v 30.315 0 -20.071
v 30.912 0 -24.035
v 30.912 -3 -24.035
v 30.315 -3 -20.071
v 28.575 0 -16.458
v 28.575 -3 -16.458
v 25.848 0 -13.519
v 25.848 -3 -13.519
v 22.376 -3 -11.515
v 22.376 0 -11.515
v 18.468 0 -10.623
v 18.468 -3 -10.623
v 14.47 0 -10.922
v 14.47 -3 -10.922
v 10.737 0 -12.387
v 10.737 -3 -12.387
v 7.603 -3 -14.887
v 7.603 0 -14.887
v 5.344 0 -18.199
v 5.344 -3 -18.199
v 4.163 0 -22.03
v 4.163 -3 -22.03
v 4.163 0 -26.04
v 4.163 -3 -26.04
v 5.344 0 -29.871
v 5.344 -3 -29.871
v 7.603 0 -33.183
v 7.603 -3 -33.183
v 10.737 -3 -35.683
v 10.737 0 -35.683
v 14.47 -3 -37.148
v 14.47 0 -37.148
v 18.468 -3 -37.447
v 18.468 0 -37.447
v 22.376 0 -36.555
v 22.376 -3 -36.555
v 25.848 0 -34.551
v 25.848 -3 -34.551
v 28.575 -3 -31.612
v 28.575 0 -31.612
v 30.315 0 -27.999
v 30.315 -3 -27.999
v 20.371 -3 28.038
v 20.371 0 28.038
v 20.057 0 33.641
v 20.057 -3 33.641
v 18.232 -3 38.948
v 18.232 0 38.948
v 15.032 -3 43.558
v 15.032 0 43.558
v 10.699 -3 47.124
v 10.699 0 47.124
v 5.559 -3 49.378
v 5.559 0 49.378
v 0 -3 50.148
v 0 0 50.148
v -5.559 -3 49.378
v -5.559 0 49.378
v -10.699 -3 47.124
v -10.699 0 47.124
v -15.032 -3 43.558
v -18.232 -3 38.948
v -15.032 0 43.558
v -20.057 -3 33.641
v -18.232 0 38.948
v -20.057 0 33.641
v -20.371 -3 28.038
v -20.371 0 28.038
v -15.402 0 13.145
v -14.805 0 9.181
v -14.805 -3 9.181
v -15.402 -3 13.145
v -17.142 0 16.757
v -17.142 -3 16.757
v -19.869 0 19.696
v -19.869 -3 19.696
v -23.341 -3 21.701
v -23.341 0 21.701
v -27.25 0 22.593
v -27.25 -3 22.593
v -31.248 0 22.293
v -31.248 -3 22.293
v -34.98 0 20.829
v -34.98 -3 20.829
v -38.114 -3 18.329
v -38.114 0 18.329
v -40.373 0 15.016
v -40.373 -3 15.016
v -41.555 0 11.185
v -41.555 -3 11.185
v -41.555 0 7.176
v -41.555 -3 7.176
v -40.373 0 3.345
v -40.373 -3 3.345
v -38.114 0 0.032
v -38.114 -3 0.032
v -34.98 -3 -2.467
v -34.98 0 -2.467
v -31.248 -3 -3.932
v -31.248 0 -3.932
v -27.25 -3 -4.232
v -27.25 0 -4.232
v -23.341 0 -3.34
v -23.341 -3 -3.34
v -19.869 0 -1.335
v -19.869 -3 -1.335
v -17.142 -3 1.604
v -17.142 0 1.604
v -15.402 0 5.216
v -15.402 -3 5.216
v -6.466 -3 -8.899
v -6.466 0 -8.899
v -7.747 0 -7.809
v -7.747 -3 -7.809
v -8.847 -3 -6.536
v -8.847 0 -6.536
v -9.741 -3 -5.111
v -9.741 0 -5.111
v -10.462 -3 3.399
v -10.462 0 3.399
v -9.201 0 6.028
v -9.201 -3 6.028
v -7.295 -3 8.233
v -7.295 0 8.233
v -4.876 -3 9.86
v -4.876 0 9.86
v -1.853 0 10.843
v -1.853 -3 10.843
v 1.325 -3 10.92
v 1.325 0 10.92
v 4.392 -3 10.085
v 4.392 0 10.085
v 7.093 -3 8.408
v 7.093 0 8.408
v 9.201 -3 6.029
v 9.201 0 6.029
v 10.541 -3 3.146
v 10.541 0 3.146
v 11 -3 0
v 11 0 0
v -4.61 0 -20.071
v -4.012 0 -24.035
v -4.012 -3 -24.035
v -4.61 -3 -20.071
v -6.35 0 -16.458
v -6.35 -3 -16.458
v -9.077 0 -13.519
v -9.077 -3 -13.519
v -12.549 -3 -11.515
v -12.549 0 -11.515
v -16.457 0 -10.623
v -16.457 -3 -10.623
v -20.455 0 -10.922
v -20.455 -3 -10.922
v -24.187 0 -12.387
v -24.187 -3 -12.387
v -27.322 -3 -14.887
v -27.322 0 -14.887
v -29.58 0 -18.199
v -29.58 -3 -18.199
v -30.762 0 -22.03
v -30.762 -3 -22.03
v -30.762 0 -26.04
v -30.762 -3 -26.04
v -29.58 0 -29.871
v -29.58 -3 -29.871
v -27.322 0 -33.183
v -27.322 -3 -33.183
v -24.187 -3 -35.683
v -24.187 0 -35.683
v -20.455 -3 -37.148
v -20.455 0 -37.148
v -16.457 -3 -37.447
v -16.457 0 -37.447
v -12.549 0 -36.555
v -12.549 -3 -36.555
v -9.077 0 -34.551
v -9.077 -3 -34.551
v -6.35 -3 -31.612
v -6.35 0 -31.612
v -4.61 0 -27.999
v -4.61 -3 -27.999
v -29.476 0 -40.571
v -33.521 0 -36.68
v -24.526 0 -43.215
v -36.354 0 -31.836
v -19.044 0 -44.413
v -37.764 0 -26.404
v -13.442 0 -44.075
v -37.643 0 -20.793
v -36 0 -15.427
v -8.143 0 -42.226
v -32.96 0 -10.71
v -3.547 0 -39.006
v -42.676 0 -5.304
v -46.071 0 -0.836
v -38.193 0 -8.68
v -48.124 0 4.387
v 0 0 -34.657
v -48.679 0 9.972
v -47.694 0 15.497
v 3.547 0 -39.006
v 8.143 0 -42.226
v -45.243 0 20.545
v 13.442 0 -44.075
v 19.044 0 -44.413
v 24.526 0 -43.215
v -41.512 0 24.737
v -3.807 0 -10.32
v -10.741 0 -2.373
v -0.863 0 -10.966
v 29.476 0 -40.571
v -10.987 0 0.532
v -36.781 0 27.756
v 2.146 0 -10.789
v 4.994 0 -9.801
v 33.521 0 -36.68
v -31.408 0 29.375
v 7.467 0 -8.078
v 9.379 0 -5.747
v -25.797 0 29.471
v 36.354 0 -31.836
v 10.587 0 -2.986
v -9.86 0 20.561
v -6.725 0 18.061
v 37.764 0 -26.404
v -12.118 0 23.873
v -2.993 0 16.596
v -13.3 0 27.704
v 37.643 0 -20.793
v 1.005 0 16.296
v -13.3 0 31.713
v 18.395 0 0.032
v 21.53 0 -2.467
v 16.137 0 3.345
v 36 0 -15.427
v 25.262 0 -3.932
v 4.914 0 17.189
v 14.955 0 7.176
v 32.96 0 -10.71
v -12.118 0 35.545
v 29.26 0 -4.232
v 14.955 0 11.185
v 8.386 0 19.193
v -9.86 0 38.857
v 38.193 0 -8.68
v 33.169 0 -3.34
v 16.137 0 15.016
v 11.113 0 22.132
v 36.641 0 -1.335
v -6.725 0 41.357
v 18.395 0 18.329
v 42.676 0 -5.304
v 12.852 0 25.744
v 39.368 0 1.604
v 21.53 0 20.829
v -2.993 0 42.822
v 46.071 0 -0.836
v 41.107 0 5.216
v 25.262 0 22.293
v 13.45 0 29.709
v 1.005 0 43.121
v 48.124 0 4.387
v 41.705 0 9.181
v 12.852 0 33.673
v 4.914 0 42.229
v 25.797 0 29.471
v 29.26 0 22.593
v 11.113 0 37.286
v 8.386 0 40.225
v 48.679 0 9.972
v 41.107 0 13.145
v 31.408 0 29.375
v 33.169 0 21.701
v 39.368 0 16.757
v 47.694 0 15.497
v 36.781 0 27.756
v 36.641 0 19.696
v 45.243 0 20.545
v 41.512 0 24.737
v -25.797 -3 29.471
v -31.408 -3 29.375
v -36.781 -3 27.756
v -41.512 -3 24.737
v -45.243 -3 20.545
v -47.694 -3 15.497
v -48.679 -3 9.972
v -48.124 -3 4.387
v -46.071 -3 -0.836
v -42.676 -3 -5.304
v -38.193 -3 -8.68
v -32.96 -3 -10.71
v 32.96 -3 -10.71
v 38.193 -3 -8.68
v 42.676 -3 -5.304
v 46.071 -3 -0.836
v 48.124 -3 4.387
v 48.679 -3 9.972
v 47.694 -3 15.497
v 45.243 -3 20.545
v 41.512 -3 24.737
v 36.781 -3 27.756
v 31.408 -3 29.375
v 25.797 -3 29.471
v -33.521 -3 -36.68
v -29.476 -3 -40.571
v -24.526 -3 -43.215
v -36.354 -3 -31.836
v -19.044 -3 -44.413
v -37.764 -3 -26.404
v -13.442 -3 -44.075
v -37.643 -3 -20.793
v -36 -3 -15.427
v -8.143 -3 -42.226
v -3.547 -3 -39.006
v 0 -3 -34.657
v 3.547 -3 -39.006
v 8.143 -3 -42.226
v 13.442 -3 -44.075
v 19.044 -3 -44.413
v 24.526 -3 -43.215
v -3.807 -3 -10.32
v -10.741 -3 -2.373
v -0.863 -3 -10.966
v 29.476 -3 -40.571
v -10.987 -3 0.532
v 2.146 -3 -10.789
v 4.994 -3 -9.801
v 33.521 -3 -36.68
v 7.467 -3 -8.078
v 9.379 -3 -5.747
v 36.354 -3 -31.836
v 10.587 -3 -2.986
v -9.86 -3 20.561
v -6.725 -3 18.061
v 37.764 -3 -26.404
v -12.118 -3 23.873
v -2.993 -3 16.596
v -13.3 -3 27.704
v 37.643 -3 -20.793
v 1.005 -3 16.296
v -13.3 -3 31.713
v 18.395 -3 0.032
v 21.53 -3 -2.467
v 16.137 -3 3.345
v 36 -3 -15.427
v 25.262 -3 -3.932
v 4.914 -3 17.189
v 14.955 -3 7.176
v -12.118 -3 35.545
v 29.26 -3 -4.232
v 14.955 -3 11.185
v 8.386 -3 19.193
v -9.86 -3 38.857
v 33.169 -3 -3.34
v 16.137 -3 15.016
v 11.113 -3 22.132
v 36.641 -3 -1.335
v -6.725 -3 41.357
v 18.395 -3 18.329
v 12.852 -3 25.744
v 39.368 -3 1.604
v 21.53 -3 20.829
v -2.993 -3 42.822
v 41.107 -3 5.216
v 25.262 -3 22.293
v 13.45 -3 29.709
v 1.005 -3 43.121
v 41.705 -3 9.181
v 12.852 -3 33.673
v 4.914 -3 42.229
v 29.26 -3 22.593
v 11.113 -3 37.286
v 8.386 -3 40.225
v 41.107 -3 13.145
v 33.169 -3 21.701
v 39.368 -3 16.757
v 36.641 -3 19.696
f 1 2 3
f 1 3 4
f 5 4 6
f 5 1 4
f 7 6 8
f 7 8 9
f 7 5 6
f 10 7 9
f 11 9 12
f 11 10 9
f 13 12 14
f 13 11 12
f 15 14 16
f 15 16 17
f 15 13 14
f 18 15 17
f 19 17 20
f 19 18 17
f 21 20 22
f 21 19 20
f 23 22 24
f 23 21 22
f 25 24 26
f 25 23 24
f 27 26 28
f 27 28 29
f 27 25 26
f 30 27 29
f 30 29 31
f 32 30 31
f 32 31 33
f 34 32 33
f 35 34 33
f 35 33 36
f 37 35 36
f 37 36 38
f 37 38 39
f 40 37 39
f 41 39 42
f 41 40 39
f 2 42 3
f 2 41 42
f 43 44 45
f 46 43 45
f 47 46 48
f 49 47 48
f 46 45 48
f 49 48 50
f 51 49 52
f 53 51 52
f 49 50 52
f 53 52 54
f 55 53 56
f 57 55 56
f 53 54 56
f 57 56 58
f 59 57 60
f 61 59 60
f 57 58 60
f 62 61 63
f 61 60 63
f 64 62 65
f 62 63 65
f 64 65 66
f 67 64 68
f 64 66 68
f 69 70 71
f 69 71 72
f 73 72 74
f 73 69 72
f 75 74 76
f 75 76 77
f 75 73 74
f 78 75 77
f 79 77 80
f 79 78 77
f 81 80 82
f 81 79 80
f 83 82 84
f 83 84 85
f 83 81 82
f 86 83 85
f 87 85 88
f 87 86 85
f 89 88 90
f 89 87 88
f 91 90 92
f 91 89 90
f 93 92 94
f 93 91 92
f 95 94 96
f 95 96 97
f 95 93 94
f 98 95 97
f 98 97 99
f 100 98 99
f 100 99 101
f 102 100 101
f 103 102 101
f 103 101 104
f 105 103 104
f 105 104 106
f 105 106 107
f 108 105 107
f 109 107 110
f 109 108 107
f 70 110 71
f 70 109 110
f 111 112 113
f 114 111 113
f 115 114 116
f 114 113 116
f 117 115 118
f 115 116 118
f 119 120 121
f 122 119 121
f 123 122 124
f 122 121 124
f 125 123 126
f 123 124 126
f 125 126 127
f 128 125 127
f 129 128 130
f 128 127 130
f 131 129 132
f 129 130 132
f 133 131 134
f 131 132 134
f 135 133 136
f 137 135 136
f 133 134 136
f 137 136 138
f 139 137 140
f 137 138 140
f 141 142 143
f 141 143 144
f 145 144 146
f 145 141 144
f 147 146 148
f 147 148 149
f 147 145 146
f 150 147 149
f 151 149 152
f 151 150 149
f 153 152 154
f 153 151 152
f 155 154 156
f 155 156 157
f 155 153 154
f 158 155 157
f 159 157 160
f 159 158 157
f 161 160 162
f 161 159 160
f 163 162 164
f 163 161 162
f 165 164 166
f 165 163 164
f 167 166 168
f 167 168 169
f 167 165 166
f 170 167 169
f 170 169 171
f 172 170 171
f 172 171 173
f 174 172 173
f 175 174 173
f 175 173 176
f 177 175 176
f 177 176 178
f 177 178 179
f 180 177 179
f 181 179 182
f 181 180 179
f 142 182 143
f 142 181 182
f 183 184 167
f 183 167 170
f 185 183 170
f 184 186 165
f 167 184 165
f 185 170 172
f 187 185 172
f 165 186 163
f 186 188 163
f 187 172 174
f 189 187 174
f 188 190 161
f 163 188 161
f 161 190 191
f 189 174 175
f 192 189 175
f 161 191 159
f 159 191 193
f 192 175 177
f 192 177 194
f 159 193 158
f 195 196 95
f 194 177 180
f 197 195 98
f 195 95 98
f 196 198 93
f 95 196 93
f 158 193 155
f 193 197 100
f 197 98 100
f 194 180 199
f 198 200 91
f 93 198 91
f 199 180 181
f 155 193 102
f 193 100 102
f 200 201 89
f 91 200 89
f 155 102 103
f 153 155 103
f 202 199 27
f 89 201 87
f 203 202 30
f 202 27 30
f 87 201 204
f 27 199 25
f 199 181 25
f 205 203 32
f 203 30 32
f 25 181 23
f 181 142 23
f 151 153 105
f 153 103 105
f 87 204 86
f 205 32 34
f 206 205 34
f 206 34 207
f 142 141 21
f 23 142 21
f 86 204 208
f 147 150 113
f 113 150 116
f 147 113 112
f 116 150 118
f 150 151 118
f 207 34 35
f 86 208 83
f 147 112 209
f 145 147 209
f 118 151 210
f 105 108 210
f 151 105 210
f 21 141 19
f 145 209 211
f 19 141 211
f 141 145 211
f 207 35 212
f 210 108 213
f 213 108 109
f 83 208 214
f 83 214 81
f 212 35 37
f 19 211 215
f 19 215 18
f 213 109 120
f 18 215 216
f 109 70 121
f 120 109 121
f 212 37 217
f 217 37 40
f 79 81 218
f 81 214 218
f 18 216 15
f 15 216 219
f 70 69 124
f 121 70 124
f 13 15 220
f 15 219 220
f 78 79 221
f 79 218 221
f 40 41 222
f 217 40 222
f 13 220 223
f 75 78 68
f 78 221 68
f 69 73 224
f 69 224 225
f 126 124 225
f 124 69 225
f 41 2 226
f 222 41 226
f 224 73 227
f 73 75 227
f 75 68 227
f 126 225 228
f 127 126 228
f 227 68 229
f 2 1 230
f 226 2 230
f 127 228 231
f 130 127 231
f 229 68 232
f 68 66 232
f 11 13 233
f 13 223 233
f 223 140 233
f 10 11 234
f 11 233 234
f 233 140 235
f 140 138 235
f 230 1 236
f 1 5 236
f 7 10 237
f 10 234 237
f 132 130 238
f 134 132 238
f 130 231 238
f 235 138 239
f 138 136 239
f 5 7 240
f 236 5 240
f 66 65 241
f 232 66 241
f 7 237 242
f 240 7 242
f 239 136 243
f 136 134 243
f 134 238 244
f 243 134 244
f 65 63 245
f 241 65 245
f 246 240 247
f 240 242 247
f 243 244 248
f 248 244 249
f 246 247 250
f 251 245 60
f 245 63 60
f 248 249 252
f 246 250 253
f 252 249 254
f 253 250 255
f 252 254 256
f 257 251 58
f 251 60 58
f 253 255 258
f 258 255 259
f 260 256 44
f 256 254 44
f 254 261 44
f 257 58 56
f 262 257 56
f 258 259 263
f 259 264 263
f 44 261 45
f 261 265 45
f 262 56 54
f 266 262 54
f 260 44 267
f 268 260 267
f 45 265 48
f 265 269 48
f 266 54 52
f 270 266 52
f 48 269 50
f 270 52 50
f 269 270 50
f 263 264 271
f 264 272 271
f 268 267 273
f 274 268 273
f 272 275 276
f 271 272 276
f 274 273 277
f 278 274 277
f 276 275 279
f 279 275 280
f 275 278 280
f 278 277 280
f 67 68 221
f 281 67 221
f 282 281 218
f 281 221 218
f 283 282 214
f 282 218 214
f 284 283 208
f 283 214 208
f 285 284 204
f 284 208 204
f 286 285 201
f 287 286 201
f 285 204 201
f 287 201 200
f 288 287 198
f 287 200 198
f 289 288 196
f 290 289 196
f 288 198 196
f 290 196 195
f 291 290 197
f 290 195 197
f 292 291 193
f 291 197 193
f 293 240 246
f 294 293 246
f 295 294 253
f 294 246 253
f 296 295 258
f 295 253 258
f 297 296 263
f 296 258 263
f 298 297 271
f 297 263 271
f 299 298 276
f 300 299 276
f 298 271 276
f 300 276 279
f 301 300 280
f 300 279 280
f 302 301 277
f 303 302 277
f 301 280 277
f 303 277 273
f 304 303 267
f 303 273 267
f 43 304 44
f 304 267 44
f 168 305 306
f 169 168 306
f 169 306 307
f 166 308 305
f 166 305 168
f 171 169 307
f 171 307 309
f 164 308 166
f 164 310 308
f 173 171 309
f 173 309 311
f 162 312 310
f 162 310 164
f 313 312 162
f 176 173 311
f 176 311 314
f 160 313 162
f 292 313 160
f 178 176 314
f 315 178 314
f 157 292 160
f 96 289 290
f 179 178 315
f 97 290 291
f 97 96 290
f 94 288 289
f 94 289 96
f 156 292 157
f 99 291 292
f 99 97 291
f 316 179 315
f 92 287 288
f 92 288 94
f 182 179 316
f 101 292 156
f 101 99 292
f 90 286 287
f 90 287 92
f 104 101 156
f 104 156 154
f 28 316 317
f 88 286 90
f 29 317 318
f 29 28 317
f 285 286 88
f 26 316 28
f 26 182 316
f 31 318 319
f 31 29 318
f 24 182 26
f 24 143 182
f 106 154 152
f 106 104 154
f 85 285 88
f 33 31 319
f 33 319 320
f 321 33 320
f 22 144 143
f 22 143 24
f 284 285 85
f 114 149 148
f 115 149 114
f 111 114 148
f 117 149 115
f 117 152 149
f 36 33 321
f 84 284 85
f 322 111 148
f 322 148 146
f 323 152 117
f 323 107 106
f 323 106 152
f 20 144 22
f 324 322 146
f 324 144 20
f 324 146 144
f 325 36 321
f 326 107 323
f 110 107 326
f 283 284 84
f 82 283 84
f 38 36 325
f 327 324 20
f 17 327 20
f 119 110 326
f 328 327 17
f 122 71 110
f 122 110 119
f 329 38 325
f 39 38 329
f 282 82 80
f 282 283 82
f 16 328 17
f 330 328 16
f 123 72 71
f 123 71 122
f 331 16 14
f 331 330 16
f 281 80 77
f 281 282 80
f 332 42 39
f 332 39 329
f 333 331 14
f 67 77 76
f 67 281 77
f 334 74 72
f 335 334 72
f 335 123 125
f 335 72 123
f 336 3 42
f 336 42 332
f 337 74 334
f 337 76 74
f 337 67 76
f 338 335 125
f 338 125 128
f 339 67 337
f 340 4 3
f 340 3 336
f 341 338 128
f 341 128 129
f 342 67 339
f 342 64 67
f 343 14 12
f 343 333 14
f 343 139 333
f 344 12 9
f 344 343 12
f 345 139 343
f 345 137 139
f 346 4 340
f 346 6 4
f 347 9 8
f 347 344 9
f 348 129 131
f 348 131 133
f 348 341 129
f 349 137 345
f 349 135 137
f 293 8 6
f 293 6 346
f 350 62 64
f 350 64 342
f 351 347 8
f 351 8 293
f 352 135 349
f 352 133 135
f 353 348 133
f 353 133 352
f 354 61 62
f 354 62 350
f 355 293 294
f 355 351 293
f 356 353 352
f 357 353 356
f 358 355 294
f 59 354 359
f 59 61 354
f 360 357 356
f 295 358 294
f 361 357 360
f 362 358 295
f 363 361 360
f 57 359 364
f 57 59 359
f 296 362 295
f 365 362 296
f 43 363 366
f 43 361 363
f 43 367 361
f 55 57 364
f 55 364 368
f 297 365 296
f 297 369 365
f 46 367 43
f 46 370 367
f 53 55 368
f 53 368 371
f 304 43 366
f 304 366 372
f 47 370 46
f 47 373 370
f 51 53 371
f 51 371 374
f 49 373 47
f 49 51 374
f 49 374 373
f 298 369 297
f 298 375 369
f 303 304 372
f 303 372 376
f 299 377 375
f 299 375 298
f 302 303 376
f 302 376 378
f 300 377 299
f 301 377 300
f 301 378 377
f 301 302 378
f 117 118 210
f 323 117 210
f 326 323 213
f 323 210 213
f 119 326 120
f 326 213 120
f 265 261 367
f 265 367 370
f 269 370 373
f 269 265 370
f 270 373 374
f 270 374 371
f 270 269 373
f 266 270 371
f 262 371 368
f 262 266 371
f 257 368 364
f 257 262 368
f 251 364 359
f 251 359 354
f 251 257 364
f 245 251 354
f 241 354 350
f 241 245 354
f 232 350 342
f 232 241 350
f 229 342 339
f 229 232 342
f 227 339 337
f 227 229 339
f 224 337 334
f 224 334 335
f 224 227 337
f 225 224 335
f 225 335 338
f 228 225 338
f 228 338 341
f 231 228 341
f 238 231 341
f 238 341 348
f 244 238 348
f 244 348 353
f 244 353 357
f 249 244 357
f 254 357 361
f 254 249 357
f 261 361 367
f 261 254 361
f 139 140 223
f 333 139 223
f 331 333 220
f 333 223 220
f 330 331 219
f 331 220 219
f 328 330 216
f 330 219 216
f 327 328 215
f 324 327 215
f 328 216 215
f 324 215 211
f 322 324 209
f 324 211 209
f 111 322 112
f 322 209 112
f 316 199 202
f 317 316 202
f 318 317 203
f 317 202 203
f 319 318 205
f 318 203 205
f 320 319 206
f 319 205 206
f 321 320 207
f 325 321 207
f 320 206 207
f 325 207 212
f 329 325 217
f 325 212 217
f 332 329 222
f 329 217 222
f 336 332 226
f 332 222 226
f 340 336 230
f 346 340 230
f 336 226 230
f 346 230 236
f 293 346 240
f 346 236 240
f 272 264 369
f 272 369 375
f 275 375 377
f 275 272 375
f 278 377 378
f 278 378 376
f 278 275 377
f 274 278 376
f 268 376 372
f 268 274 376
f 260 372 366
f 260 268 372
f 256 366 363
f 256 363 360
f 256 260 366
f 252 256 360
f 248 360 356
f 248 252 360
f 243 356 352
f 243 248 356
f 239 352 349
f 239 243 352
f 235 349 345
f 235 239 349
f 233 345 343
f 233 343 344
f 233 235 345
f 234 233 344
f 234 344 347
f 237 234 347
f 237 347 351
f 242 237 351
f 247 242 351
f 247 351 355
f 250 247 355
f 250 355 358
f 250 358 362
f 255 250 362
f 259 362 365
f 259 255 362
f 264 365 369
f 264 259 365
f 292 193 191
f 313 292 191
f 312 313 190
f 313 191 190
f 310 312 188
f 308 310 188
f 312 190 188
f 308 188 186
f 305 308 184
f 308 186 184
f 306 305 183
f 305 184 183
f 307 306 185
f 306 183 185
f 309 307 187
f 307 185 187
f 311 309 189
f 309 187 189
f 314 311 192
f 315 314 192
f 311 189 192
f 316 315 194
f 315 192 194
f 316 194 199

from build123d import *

# Parameters (mm, degrees)
F0_R     = 13.45
F1_DEPTH = 3


with BuildPart() as f1:
    # F0 (on Front) → F1 (new body)
    with BuildSketch(Plane.XZ):
        with BuildLine():
            ThreePointArc((32.960464, -10.709504), (47.693573, 15.496581), (20.370687, 28.037846))
            ThreePointArc((20.370687, 28.037846), (0, 50.14799), (-20.370687, 28.037846))
            ThreePointArc((-20.370687, 28.037846), (-47.693573, 15.496581), (-32.960464, -10.709504))
            ThreePointArc((-32.960464, -10.709504), (-29.476249, -40.570576), (0, -34.656683))
            ThreePointArc((0, -34.656683), (29.476249, -40.570576), (32.960464, -10.709504))
        make_face()
        with Locations((-17.462441, -24.034988)):
            Circle(F0_R, mode=Mode.SUBTRACT)
        with BuildLine():
            ThreePointArc((-4.876476, 9.860019), (5.803394, 9.34455), (11, 0))
            ThreePointArc((11, 0), (4.993895, -9.801072), (-6.465638, -8.899187))
            ThreePointArc((-6.465638, -8.899187), (-8.321652, -7.193754), (-9.740726, -5.110602))
            ThreePointArc((-9.740726, -5.110602), (-10.960741, -0.928525), (-10.461622, 3.399187))
            ThreePointArc((-10.461622, 3.399187), (-8.321652, 7.193754), (-4.876476, 9.860019))
        make_face(mode=Mode.SUBTRACT)
        with Locations((17.462441, -24.034988)):
            Circle(F0_R, mode=Mode.SUBTRACT)
        with Locations((-28.254823, 9.180549)):
            Circle(F0_R, mode=Mode.SUBTRACT)
        with Locations((0, 29.708879)):
            Circle(F0_R, mode=Mode.SUBTRACT)
        with Locations((28.254823, 9.180549)):
            Circle(F0_R, mode=Mode.SUBTRACT)
    extrude(amount=F1_DEPTH)


solid = f1.part
